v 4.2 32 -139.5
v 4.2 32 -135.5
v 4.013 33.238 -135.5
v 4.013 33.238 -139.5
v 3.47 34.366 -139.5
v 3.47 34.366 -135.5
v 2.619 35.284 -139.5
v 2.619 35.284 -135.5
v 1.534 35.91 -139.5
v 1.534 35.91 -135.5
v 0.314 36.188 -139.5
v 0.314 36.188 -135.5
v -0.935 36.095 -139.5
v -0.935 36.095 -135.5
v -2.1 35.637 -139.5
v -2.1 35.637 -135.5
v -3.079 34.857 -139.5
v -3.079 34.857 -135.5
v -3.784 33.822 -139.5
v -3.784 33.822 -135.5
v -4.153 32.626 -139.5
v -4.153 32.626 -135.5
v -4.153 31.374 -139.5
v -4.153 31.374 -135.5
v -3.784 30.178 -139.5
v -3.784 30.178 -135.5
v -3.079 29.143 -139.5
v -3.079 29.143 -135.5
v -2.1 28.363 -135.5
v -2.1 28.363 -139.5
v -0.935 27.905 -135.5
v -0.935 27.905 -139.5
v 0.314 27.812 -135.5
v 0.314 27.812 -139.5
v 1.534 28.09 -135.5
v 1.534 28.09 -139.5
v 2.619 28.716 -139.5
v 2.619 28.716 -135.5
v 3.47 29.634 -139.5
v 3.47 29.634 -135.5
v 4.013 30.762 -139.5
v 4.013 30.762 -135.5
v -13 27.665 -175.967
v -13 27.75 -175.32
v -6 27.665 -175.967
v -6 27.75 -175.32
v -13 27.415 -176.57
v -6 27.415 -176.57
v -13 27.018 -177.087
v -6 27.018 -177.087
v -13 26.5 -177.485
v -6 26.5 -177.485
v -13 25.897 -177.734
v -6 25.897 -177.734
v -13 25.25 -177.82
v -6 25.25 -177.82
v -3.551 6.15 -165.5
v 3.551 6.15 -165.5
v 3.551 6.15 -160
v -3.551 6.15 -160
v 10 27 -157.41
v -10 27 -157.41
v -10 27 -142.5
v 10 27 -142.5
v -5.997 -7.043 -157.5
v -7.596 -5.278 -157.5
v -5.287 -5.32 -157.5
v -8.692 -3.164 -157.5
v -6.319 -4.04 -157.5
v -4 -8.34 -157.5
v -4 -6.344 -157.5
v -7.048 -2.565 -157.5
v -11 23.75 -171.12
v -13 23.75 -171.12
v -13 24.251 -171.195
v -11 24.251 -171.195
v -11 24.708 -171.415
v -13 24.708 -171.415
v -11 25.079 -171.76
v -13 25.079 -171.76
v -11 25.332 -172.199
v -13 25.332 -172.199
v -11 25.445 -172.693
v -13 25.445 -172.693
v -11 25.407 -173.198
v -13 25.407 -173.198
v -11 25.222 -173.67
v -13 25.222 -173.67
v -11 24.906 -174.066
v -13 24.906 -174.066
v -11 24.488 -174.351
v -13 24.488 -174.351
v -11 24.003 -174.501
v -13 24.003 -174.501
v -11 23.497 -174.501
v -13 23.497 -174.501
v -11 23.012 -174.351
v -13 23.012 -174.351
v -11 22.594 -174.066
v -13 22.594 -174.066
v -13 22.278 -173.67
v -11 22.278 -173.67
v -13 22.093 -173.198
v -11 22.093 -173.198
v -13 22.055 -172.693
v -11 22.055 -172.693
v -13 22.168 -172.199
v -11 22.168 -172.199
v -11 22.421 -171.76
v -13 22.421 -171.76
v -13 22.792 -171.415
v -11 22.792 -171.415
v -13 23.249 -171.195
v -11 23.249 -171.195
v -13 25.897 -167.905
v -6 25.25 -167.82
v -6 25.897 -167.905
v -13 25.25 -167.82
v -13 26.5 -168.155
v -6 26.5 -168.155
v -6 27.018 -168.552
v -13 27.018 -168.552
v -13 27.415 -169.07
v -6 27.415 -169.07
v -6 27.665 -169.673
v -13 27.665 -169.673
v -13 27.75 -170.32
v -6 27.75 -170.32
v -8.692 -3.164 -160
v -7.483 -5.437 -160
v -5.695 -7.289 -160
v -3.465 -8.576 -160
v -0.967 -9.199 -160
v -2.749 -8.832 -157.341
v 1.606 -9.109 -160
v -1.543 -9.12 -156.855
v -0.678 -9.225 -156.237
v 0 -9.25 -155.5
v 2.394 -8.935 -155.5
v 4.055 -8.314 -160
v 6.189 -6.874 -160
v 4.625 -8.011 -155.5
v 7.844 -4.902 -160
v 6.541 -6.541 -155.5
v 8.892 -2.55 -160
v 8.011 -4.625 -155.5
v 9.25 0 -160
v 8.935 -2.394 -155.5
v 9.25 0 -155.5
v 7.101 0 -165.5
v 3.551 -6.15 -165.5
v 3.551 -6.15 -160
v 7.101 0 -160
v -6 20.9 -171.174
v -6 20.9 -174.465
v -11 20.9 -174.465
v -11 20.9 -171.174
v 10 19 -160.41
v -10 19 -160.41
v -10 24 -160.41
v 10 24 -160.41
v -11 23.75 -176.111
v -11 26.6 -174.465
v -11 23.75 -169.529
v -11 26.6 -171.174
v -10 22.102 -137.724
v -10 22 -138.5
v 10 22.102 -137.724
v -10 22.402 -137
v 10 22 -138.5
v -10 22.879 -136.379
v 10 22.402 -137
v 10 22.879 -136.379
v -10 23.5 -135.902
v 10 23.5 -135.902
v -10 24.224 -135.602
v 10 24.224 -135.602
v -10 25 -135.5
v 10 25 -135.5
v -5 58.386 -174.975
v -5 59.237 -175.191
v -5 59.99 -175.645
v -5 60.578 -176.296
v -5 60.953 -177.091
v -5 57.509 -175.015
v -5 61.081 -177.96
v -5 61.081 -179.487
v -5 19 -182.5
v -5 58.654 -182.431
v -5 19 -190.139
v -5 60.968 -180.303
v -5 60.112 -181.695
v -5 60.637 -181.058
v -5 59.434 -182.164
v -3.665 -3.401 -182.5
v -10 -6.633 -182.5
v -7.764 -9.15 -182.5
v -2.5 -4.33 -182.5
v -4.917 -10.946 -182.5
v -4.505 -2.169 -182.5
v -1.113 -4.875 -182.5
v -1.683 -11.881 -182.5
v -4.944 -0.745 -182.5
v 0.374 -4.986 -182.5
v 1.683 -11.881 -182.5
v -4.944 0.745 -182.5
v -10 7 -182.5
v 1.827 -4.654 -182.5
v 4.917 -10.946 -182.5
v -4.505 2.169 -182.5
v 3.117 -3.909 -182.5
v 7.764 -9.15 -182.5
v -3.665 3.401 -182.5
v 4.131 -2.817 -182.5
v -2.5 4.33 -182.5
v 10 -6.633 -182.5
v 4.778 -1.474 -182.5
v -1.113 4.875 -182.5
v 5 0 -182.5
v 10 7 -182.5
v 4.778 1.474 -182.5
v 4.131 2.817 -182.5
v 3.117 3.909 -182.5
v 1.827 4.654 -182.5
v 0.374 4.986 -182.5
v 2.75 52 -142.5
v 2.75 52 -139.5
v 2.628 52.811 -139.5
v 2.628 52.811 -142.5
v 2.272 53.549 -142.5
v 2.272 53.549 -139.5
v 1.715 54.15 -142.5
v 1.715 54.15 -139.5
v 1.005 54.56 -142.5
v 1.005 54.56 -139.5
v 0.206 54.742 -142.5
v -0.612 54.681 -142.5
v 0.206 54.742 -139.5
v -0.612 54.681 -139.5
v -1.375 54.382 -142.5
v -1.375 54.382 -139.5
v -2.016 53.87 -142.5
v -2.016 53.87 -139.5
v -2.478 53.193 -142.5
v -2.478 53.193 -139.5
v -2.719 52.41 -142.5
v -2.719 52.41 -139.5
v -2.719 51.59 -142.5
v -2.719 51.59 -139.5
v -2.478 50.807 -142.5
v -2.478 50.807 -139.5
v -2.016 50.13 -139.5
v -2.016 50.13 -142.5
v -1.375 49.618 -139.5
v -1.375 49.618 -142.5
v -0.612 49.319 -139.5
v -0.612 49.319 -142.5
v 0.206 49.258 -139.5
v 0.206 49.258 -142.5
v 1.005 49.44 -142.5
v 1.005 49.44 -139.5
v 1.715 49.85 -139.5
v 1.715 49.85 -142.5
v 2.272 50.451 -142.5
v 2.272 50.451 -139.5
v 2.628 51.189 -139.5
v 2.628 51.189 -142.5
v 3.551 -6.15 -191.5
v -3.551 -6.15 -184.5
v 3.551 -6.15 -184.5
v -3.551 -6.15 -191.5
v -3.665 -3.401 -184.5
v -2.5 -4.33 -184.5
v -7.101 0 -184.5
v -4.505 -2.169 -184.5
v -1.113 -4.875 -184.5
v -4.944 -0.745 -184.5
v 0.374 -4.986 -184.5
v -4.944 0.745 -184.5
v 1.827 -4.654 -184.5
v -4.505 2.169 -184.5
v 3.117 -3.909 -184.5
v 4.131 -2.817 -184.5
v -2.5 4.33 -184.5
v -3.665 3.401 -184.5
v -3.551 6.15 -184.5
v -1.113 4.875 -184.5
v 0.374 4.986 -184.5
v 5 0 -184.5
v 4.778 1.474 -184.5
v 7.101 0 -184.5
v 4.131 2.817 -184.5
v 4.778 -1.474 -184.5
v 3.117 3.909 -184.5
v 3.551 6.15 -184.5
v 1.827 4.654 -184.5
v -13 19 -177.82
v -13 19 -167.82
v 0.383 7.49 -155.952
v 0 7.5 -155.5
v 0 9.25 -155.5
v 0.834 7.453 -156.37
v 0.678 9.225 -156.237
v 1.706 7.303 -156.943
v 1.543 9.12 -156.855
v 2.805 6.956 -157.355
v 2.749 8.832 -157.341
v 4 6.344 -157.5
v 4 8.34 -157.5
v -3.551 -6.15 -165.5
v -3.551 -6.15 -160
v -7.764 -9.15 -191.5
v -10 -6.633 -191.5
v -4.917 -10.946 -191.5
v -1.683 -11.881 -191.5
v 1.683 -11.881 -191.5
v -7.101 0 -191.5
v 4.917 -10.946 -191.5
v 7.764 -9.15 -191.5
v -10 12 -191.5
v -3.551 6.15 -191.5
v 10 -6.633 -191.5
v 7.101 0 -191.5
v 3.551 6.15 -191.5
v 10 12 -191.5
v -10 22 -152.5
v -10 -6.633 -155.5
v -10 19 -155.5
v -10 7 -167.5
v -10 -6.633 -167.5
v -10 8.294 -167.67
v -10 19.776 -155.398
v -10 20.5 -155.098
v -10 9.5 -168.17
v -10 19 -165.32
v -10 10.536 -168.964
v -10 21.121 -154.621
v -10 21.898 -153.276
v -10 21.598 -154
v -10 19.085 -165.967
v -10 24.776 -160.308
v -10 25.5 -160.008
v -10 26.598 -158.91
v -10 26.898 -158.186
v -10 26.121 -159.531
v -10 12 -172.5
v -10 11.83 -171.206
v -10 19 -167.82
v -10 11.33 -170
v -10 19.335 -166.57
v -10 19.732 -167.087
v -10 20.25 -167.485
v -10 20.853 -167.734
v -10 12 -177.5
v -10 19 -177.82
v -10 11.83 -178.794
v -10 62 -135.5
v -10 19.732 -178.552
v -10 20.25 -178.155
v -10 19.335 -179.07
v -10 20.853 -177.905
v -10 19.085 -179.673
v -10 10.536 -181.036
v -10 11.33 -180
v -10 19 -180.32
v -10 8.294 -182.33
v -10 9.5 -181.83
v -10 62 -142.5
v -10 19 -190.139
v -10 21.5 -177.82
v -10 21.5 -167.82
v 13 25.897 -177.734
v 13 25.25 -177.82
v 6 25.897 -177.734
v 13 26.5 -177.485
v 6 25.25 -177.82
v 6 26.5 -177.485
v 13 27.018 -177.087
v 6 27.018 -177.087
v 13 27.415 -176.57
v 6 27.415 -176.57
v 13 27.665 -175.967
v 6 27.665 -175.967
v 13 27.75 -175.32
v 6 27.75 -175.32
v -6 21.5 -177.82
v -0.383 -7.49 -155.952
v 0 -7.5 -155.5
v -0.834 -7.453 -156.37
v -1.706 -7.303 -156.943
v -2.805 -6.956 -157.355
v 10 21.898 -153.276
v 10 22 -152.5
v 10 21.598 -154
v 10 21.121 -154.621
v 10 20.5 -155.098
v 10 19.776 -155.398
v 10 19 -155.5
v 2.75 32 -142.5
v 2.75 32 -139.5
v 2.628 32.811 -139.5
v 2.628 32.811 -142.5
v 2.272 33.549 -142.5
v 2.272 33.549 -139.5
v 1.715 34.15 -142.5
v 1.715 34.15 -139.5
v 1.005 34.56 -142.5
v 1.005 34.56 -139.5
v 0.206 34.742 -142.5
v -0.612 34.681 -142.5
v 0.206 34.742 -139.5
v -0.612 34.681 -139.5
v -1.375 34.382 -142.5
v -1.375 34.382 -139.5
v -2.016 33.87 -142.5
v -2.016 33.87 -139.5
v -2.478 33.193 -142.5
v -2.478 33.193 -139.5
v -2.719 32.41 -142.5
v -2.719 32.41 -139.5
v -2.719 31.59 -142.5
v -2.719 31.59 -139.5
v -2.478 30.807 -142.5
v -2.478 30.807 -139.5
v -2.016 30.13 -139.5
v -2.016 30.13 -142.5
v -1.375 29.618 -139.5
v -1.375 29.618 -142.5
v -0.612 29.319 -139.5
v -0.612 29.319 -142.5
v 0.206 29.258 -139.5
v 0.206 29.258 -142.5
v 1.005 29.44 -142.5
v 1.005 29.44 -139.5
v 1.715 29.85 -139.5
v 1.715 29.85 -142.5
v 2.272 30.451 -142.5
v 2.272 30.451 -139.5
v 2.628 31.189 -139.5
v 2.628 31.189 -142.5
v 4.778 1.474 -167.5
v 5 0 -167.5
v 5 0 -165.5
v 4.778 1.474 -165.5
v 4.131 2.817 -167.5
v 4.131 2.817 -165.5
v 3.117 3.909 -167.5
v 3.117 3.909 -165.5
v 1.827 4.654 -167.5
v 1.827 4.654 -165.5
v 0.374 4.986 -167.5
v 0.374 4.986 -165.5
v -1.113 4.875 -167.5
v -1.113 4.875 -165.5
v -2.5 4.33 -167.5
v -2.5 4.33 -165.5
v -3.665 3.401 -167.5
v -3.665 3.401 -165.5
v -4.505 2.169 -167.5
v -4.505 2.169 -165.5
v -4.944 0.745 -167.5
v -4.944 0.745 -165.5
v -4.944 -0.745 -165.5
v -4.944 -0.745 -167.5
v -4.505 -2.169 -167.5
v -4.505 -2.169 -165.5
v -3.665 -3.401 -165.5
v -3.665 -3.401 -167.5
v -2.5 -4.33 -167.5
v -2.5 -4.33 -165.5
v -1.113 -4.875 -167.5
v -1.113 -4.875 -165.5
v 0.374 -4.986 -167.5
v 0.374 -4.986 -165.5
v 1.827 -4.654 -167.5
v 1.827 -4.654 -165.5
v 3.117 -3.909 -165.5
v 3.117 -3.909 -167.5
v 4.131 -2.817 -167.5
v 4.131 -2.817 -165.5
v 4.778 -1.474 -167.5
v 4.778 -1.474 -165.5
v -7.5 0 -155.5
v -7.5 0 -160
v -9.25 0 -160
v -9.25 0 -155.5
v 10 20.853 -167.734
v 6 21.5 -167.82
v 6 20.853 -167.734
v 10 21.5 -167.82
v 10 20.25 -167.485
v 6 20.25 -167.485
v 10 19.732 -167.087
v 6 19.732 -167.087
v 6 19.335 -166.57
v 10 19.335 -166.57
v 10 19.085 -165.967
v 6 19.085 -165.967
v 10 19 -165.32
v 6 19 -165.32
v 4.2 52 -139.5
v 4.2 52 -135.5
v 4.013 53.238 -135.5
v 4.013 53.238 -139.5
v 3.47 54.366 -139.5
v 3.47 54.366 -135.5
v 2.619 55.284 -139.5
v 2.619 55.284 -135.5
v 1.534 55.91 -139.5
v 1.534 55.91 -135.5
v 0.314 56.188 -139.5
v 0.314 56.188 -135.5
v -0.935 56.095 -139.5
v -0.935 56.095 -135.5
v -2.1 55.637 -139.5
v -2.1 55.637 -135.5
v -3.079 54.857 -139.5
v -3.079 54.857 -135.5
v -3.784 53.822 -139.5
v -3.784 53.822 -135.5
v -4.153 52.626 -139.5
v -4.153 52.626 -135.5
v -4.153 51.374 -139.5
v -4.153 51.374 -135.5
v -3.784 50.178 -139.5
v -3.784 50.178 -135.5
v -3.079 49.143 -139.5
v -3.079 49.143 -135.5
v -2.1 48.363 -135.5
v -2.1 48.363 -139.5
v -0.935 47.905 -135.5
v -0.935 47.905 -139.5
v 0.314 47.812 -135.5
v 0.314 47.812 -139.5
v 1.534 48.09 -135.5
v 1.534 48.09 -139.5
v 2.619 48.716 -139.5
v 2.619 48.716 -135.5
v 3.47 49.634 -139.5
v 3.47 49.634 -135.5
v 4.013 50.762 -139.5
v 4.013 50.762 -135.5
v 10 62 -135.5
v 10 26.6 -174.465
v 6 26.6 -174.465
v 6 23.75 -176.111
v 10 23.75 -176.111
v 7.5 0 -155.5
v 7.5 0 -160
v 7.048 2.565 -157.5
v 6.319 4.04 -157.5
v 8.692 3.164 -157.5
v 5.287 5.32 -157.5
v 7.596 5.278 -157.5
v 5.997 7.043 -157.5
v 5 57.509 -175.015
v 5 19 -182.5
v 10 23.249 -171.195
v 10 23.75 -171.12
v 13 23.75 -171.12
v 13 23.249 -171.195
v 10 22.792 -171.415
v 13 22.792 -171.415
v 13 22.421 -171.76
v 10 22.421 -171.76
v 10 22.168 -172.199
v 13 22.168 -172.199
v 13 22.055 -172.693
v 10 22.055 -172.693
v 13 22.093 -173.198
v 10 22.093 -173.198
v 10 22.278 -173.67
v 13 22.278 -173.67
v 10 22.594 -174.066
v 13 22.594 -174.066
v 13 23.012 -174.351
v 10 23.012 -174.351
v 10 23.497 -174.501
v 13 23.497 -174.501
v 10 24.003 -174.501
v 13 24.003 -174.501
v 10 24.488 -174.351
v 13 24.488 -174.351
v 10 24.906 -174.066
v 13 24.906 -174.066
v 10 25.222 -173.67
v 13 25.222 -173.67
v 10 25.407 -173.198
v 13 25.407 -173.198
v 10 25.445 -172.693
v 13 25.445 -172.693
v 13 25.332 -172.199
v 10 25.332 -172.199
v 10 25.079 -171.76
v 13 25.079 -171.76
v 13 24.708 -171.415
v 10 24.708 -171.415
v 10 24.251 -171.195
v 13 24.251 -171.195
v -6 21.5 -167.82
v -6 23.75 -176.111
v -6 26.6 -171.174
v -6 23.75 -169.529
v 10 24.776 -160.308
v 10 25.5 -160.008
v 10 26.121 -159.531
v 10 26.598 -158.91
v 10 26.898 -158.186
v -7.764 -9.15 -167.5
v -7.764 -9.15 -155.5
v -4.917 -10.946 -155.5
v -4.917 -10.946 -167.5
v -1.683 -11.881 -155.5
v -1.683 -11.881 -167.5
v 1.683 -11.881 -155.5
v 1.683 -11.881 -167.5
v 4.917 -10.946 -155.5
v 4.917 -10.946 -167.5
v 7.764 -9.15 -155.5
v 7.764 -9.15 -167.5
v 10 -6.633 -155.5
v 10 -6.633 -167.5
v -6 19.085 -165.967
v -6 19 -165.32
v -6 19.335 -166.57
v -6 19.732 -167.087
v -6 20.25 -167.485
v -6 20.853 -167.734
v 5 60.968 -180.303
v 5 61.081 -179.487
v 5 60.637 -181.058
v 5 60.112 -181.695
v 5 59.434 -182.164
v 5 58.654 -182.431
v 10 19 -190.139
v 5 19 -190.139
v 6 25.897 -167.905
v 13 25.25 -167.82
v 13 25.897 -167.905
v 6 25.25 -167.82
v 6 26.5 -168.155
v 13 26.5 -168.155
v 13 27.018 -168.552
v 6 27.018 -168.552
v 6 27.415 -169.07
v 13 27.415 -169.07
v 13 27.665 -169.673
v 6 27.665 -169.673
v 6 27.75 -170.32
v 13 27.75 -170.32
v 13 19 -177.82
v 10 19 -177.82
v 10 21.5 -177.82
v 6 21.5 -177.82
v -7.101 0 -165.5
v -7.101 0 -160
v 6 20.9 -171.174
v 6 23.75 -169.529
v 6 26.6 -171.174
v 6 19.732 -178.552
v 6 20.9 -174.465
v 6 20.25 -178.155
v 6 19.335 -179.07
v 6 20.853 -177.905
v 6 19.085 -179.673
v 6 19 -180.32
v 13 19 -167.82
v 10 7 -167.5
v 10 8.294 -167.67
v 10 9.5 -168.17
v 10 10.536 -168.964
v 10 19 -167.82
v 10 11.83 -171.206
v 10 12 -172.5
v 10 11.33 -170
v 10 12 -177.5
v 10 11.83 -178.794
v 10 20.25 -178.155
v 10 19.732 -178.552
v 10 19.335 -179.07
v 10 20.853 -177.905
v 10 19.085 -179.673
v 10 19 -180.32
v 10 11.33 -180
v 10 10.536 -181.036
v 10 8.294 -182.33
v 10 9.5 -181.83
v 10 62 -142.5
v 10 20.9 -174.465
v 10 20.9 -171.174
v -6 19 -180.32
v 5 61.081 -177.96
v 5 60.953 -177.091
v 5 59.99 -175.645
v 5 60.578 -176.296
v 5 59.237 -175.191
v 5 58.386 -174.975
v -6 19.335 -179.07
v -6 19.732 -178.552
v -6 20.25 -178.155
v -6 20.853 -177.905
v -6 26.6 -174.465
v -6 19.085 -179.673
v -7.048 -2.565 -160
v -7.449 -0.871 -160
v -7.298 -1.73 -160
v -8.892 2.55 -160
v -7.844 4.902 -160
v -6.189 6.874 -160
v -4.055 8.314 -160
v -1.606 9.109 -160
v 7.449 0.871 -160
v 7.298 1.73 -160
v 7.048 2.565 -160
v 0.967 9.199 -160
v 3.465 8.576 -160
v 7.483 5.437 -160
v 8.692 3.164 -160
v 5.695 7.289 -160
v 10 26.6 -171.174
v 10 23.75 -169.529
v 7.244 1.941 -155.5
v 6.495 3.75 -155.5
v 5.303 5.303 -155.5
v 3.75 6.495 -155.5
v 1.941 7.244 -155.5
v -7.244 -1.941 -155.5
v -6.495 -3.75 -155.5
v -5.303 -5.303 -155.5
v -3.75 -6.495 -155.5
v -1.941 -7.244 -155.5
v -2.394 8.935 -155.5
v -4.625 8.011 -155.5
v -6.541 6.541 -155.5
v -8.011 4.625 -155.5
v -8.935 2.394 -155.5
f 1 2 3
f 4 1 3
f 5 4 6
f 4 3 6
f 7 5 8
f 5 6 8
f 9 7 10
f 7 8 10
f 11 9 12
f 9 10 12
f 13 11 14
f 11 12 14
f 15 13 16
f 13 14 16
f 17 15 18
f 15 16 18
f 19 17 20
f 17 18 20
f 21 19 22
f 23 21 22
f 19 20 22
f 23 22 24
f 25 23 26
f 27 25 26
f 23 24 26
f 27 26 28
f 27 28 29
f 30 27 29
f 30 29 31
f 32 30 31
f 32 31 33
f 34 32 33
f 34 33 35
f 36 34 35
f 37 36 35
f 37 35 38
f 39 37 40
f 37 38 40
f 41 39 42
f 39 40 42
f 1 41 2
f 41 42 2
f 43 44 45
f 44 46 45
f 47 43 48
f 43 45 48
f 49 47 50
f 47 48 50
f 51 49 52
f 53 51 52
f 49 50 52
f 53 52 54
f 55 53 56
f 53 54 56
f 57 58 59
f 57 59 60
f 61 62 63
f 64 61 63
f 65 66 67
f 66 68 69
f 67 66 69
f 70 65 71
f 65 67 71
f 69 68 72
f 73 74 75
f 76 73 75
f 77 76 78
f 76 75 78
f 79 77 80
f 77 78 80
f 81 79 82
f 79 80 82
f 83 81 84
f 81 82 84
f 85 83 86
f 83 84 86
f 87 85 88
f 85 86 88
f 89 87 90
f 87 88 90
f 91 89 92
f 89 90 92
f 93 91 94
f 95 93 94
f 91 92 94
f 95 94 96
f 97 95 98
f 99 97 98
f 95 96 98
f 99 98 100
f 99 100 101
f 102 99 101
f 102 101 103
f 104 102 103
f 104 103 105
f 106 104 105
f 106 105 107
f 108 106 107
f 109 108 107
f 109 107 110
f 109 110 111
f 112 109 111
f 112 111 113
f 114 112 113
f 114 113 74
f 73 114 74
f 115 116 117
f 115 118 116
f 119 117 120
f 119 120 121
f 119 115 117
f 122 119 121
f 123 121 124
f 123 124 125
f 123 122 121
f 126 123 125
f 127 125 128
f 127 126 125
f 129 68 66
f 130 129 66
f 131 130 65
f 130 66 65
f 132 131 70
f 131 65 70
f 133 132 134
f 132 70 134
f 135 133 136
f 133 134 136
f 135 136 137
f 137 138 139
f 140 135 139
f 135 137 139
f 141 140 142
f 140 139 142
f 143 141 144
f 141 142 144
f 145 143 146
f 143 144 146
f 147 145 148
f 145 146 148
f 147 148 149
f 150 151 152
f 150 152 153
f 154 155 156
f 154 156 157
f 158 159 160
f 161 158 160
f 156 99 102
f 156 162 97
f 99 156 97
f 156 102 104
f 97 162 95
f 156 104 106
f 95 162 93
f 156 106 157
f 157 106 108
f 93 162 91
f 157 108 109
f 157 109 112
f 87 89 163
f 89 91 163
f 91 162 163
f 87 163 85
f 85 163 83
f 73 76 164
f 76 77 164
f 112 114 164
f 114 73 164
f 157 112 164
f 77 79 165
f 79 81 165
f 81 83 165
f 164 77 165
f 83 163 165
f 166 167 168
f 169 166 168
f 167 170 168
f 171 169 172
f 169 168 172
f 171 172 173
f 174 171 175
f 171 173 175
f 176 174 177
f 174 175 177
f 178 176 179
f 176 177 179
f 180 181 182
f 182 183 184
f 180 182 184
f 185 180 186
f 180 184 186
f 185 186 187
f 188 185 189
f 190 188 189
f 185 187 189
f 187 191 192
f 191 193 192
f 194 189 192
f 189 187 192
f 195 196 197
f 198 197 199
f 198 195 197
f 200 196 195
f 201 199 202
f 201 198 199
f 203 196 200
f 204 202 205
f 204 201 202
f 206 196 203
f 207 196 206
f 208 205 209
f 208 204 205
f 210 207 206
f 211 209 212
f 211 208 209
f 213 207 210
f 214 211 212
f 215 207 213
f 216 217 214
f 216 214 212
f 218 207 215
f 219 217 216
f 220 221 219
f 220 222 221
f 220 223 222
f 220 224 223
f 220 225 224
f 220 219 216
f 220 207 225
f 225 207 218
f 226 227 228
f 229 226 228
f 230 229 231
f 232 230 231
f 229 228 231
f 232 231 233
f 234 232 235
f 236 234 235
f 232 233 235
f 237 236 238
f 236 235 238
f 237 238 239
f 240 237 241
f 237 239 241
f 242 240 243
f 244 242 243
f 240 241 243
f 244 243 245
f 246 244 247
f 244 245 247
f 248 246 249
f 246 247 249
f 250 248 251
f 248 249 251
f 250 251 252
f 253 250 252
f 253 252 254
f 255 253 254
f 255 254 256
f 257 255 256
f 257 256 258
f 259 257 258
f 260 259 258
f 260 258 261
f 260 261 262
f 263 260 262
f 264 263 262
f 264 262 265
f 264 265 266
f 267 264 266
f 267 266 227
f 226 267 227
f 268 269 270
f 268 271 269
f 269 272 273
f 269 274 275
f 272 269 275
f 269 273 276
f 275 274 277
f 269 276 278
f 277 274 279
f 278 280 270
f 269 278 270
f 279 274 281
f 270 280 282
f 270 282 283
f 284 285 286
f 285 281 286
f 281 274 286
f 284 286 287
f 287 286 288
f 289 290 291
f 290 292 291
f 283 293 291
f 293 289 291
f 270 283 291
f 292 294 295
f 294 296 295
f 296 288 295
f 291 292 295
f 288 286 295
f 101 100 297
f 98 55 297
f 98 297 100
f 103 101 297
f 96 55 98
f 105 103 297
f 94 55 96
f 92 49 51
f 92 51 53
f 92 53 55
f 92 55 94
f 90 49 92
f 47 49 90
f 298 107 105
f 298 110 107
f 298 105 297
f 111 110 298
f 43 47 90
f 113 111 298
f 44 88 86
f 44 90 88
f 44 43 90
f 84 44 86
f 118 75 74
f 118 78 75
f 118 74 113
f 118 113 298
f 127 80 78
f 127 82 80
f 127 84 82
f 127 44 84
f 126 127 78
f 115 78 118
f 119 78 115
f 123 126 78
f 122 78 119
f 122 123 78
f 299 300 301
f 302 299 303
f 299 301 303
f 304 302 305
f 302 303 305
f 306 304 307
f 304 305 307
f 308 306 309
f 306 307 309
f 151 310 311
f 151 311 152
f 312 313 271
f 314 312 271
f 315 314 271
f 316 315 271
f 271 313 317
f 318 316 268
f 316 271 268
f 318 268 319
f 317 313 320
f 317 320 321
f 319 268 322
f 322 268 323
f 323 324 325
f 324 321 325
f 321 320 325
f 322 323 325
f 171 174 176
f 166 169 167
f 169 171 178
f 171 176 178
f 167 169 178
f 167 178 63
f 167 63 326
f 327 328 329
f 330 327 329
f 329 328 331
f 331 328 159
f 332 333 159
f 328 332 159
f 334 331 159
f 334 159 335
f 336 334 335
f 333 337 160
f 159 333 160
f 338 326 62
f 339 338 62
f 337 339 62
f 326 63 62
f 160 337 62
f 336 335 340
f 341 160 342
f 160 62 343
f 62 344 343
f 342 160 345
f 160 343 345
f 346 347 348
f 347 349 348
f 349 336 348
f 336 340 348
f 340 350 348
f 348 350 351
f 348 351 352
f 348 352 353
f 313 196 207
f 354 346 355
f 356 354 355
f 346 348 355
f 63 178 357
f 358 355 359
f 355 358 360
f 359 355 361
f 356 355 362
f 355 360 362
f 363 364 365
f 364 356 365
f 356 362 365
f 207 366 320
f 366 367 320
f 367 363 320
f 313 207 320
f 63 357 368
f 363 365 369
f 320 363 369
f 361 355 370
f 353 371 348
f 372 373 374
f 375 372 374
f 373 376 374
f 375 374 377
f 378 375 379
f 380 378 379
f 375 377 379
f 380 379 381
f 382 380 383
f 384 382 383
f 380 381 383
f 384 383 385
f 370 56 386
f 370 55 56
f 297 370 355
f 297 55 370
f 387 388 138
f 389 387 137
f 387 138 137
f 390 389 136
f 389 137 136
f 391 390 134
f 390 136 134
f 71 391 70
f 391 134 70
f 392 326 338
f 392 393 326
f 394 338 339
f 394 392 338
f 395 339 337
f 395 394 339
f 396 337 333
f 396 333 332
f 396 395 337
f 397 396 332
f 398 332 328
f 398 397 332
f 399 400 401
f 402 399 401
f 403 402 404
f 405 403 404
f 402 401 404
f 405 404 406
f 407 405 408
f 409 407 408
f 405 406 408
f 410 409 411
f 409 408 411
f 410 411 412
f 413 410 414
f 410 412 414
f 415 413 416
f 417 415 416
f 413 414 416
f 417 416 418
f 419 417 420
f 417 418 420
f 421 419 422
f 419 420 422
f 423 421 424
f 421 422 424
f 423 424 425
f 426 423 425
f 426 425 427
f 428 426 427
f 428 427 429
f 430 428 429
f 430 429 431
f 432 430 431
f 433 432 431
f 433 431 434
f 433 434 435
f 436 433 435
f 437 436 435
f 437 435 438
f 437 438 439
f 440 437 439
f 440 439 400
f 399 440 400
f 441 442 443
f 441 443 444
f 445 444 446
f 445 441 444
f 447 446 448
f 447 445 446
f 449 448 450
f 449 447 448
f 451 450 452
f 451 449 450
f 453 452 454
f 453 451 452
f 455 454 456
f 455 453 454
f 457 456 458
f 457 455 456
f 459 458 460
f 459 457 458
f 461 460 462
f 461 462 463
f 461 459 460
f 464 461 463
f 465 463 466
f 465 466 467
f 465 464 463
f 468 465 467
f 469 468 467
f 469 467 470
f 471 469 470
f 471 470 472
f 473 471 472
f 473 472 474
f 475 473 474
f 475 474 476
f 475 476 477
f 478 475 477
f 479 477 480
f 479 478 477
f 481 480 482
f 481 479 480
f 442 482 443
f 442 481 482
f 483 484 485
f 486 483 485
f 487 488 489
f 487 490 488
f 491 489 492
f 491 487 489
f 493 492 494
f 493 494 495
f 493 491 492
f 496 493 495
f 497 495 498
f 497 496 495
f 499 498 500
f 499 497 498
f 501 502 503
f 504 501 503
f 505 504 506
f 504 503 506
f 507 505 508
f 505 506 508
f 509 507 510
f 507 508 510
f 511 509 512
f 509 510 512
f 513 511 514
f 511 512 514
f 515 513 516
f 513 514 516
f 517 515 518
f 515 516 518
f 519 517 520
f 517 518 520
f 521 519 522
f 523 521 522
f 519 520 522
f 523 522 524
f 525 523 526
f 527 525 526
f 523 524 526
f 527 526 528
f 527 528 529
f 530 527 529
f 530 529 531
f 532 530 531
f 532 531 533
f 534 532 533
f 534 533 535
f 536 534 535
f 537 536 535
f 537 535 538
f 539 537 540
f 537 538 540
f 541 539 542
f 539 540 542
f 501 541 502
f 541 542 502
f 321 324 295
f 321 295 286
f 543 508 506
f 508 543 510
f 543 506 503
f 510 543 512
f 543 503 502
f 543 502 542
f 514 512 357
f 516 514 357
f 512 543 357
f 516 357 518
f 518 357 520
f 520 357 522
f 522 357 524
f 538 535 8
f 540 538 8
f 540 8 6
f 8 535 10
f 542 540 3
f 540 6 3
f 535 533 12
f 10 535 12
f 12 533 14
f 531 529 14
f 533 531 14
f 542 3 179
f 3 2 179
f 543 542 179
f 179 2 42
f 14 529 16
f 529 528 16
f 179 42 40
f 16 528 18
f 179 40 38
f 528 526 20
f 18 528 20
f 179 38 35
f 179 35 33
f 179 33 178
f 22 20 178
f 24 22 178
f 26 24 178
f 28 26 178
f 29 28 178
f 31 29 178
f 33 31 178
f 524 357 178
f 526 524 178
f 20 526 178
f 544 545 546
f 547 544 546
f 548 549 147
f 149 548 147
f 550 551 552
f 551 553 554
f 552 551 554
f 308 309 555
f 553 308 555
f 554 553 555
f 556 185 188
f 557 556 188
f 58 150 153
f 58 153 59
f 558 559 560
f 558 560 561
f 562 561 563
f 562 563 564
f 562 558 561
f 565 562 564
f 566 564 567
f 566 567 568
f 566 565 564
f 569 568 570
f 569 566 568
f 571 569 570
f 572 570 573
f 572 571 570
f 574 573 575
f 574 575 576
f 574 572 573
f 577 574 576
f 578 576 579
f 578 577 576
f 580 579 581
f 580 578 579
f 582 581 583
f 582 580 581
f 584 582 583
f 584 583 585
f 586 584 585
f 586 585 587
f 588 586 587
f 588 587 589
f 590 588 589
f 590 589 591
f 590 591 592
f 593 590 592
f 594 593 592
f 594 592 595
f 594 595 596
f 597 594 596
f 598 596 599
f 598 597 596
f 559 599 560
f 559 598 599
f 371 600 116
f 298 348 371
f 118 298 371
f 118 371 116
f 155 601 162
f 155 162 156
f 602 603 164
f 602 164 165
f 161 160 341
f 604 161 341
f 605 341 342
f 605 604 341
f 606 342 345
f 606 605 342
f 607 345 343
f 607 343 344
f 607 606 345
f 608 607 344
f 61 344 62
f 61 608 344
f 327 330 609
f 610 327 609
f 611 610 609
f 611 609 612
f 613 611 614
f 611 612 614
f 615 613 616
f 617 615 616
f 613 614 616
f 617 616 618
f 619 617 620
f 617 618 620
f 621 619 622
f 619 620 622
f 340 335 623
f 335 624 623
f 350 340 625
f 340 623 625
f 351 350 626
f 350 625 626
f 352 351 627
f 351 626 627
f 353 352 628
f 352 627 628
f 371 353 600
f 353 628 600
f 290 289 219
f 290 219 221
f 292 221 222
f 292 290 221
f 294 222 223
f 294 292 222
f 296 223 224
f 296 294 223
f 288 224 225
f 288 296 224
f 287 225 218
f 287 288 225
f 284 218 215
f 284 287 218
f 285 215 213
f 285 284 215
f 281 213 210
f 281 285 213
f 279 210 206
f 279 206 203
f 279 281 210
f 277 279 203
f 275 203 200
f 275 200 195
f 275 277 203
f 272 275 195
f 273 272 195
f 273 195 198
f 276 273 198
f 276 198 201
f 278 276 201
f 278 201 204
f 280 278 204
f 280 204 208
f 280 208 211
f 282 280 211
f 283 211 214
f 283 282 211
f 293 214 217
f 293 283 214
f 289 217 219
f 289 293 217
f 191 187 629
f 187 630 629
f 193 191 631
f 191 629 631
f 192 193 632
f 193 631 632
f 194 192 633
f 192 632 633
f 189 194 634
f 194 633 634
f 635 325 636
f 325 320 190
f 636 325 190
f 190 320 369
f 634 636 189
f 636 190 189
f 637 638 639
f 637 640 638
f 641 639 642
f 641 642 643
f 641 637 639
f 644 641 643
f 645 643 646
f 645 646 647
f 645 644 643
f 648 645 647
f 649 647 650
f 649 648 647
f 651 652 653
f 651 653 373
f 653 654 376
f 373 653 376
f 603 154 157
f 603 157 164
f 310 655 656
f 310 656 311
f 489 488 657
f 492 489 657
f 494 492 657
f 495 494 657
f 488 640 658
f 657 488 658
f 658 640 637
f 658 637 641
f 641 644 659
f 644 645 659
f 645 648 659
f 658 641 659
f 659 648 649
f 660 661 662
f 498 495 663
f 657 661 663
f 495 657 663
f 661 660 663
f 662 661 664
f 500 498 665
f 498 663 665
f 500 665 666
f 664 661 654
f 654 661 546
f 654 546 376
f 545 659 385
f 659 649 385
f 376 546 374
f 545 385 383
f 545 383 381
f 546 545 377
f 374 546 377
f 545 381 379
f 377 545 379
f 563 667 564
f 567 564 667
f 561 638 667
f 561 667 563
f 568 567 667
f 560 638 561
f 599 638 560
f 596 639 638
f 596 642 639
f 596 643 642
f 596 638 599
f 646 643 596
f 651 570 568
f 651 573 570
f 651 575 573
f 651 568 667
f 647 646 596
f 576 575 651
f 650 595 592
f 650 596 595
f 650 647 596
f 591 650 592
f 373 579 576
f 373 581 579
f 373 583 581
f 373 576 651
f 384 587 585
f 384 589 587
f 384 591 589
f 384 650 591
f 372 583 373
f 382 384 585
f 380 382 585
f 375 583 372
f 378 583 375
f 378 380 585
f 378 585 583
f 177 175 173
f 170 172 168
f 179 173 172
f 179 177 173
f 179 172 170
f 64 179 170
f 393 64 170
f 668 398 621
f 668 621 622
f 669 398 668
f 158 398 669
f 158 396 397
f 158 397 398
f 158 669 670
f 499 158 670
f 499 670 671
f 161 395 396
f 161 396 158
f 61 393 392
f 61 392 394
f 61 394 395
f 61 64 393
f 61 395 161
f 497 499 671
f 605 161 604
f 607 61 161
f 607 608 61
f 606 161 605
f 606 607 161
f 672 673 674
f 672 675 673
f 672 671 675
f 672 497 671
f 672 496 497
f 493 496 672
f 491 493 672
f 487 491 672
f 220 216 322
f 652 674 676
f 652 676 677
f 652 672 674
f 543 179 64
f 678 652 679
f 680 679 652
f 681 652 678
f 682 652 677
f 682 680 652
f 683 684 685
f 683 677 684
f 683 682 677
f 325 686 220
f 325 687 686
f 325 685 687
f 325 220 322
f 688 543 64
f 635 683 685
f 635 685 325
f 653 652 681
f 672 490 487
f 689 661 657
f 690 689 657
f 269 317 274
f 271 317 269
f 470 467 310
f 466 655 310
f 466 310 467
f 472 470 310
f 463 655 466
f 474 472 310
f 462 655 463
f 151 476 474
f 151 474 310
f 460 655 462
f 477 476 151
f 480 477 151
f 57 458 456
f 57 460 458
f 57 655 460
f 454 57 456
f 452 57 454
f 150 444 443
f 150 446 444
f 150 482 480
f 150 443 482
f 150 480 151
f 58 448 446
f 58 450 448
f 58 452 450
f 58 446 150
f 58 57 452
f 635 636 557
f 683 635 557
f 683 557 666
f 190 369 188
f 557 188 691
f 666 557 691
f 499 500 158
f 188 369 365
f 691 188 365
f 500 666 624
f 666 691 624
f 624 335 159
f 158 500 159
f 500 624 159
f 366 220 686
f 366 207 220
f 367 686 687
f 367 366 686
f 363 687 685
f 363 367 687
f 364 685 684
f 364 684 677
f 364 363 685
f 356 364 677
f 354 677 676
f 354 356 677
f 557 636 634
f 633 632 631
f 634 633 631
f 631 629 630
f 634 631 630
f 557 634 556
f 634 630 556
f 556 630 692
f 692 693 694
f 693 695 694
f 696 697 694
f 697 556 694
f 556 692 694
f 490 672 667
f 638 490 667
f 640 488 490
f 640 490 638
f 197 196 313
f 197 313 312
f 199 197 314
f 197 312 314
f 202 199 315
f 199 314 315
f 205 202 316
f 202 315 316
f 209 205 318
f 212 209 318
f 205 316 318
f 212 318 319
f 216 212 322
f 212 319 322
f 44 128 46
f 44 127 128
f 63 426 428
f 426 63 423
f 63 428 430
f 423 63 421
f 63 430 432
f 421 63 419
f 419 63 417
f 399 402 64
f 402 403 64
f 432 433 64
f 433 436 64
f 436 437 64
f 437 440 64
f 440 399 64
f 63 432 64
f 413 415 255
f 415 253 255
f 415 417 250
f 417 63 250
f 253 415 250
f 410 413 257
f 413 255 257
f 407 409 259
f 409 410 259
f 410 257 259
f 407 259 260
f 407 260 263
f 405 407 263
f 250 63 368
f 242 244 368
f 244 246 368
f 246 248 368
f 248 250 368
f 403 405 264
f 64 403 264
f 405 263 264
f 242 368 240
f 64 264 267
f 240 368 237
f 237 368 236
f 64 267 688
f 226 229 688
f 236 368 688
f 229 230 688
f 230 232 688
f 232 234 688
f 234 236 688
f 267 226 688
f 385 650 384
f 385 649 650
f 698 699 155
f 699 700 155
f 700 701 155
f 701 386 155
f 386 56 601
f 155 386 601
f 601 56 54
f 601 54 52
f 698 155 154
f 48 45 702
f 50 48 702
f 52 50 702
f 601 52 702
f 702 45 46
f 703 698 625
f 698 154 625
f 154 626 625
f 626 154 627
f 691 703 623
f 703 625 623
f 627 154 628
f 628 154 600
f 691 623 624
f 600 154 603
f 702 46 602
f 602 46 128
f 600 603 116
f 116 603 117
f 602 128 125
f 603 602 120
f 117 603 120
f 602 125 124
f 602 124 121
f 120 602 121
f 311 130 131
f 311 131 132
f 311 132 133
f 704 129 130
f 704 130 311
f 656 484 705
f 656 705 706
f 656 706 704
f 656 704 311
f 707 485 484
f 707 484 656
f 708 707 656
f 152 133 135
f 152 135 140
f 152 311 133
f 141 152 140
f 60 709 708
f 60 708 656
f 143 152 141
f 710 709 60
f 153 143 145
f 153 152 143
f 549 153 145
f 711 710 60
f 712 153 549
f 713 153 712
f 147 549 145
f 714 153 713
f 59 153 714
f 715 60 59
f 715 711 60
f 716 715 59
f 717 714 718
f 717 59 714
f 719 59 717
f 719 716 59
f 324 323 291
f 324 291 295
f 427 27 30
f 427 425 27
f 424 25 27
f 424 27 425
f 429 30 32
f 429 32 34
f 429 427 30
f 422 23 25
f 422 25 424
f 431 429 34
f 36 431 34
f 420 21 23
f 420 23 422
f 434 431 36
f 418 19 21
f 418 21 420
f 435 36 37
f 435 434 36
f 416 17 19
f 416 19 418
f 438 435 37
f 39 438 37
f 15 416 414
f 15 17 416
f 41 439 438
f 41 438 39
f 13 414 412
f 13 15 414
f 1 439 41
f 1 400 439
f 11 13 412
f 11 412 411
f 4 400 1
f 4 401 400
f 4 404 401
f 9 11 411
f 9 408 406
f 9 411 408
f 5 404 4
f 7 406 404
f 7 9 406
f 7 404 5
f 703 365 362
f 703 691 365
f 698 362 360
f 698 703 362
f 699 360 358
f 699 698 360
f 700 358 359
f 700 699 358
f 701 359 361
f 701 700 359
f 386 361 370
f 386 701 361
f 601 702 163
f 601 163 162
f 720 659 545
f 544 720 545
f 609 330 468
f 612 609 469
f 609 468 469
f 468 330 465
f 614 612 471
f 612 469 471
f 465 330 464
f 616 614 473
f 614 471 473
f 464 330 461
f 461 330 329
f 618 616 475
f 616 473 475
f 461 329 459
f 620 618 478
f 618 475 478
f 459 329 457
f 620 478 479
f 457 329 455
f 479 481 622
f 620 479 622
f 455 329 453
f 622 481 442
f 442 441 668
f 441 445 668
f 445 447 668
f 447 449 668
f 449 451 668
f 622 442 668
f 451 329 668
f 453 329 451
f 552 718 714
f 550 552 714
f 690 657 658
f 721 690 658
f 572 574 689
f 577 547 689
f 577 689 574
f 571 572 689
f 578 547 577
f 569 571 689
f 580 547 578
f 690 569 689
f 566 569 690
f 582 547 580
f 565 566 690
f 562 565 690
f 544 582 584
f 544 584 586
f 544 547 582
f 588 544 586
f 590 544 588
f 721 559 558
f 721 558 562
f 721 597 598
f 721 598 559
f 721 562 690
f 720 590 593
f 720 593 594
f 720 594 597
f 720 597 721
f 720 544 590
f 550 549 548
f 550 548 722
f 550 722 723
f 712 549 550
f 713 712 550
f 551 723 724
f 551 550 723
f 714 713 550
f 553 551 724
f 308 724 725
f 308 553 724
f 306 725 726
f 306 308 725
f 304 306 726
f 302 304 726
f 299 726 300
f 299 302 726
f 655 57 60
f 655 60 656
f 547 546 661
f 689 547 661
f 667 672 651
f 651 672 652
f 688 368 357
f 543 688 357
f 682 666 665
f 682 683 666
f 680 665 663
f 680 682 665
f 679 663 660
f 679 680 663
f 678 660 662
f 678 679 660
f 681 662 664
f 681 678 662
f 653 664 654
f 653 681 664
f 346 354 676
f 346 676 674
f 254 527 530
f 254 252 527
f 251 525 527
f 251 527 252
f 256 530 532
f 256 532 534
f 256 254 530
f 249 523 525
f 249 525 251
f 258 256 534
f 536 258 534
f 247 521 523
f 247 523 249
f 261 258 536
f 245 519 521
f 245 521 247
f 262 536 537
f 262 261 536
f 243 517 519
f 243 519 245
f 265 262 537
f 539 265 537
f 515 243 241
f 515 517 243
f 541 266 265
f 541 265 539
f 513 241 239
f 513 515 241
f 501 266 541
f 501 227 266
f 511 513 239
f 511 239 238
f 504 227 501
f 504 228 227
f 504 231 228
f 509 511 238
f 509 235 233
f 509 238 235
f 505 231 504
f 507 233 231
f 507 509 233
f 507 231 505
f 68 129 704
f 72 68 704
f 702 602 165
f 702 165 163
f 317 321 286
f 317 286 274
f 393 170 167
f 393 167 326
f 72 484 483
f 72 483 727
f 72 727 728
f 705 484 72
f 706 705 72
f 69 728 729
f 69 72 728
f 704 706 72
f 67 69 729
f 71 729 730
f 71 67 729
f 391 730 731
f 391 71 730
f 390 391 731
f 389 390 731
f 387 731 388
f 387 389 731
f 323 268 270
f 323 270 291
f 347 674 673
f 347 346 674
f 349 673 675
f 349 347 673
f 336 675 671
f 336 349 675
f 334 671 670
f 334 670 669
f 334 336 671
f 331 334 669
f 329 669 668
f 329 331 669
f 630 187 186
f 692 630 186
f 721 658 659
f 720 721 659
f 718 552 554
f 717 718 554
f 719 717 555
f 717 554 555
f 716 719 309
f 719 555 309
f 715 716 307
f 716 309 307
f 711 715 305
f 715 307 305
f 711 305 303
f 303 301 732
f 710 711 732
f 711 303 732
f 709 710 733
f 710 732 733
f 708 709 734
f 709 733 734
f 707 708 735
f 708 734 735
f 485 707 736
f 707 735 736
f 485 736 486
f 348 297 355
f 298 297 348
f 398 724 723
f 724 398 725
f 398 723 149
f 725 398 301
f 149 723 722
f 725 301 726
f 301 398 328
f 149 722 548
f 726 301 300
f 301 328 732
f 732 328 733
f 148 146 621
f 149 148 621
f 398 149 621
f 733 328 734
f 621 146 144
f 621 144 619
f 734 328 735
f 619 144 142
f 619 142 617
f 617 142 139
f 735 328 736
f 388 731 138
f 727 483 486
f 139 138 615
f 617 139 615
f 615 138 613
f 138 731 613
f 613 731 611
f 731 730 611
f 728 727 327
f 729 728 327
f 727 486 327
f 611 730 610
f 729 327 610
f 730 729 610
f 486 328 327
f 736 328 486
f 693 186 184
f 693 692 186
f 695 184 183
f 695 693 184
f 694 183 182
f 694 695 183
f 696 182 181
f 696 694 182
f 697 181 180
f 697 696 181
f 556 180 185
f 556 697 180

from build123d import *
from build123d.topology import SkipClean

# Parameters (mm, degrees)
BOSS_EXTRUDE1_DEPTH  = 5
CUT_EXTRUDE1_DEPTH   = 17.401219467
BOSS_EXTRUDE2_DEPTH  = 2
SKETCH6_R            = 5
BOSS_EXTRUDE3_DEPTH  = 2
SKETCH7_R            = 5
BOSS_EXTRUDE4_DEPTH  = 2
BOSS_EXTRUDE5_DEPTH  = 10
SKETCH9_R            = 7.5
CUT_EXTRUDE2_DEPTH   = 4.5
SKETCH11_R           = 9.25
CUT_EXTRUDE3_DEPTH   = 4.5
BOSS_EXTRUDE6_DEPTH  = 4.5
BOSS_EXTRUDE7_DEPTH  = 2
FILLET1_R            = 5
CUT_EXTRUDE4_START   = -4.5
SKETCH15_R           = 7.5
CUT_EXTRUDE4_DEPTH   = 4.5
BOSS_EXTRUDE8_DEPTH  = 20
FILLET2_R            = 5
SKETCH17_W           = 5
SKETCH17_H           = 9.540449769
SKETCH17_H_2         = 7.639337836
SKETCH17_H_3         = 12.1686109
CUT_EXTRUDE5_DEPTH   = 42.081359172
FILLET3_R            = 3
BOSS_EXTRUDE9_DEPTH  = 4
BOSS_EXTRUDE10_START = -4
SKETCH19_W           = 10
SKETCH19_H           = 8.75
SKETCH19_R           = 1.7
BOSS_EXTRUDE10_DEPTH = 4
BOSS_EXTRUDE11_START = 3
SKETCH20_W           = 10
SKETCH20_H           = 8.75
SKETCH20_R           = 1.7
BOSS_EXTRUDE11_DEPTH = 3
SKETCH21_W           = 10
SKETCH21_H           = 8.75
SKETCH21_R           = 1.7
BOSS_EXTRUDE12_DEPTH = 3
CUT_EXTRUDE6_DEPTH   = 4
CUT_EXTRUDE7_DEPTH   = 5
FILLET5_R            = 2.5
BOSS_EXTRUDE14_DEPTH = 20
SKETCH27_W           = 20
SKETCH27_H           = 40
BOSS_EXTRUDE16_DEPTH = 7
SKETCH28_R           = 4.2
CUT_EXTRUDE8_DEPTH   = 4
SKETCH29_R           = 2.75
CUT_EXTRUDE9_DEPTH   = 4
FILLET6_R            = 3


with BuildPart() as part:
    # Sketch2 → Boss-Extrude1 (new body)
    # profile 1 of 2: a face of its own
    with BuildSketch(Plane.XY.offset(-191.5)):
        with BuildLine():
            Line((10, 12), (0, 12))
            ThreePointArc((0, 12), (-5.674548662, 10.573528147), (-10, 6.633249581))
            Line((-10, 6.633249581), (-10, -6.633249581))
            ThreePointArc((-10, -6.633249581), (0, -12), (10, -6.633249581))
            Line((10, -6.633249581), (10, 12))
        make_face()
        Polygon((6.92820323, 0), (3.464101615, -6), (-3.464101615, -6), (-6.92820323, 0), (-3.464101615, 6), (3.464101615, 6), align=None, mode=Mode.SUBTRACT)
    # profile 2 of 2: a face of its own
    with BuildSketch(Plane.XY.offset(-191.5)):
        with BuildLine():
            ThreePointArc((-10, 6.633249581), (-5.674548662, 10.573528147), (0, 12))
            Line((0, 12), (-10, 12))
            Line((-10, 12), (-10, 6.633249581))
        make_face()
    extrude(amount=BOSS_EXTRUDE1_DEPTH)

    # Sketch3 → Cut-Extrude1 (cut, through all)
    with BuildSketch(Plane.XY.offset(-186.5)):
        Polygon((7.101408311, 0), (3.550704156, 6.15), (-3.550704156, 6.15), (-7.101408311, 0), (-3.550704156, -6.15), (3.550704156, -6.15), align=None)
    extrude(amount=-CUT_EXTRUDE1_DEPTH, mode=Mode.SUBTRACT)

    # Sketch5 → Boss-Extrude2 (add)
    with BuildSketch(Plane.XY.offset(-186.5)):
        with BuildLine():
            Line((10, 12), (-10, 12))
            Line((-10, 12), (-10, -6.633249581))
            ThreePointArc((-10, -6.633249581), (0, -12), (10, -6.633249581))
            Line((10, -6.633249581), (10, 12))
        make_face()
        Polygon((-3.550704156, -6.15), (3.550704156, -6.15), (7.101408311, 0), (3.550704156, 6.15), (-3.550704156, 6.15), (-7.101408311, 0), align=None, mode=Mode.SUBTRACT)
    extrude(amount=BOSS_EXTRUDE2_DEPTH)

    # Sketch6 → Boss-Extrude3 (add)
    with BuildSketch(Plane.XY.offset(-184.5)):
        with BuildLine():
            Line((10, -6.633249581), (10, 12))
            Line((10, 12), (-10, 12))
            Line((-10, 12), (-10, -6.633249581))
            ThreePointArc((-10, -6.633249581), (0, -12), (10, -6.633249581))
        make_face()
        Circle(SKETCH6_R, mode=Mode.SUBTRACT)
    extrude(amount=BOSS_EXTRUDE3_DEPTH)



with BuildPart() as body_2:
    # Sketch7 → Boss-Extrude4 (new body)
    with BuildSketch(Plane.XY.offset(-167.5)):
        with BuildLine():
            Line((10, -6.633249581), (10, 12))
            Line((10, 12), (-10, 12))
            Line((-10, 12), (-10, -6.633249581))
            ThreePointArc((-10, -6.633249581), (0, -12), (10, -6.633249581))
        make_face()
        Circle(SKETCH7_R, mode=Mode.SUBTRACT)
    extrude(amount=BOSS_EXTRUDE4_DEPTH)

    # Sketch8 → Boss-Extrude5 (add)
    with BuildSketch(Plane.XY.offset(-165.5)):
        with BuildLine():
            Line((10, -6.633249581), (10, 12))
            Line((10, 12), (-10, 12))
            Line((-10, 12), (-10, -6.633249581))
            ThreePointArc((-10, -6.633249581), (0, -12), (10, -6.633249581))
        make_face()
        Polygon((7.101408311, 0), (3.550704156, 6.15), (-3.550704156, 6.15), (-7.101408311, 0), (-3.550704156, -6.15), (3.550704156, -6.15), align=None, mode=Mode.SUBTRACT)
    extrude(amount=BOSS_EXTRUDE5_DEPTH)

    # Sketch9 → Cut-Extrude2 (cut)
    with BuildSketch(Plane.XY.offset(-155.5)):
        Circle(SKETCH9_R)
    extrude(amount=-CUT_EXTRUDE2_DEPTH, mode=Mode.SUBTRACT)

    # Sketch11 → Cut-Extrude3 (cut)
    with BuildSketch(Plane.XY.offset(-155.5)):
        Circle(SKETCH11_R)
    extrude(amount=-CUT_EXTRUDE3_DEPTH, mode=Mode.SUBTRACT)

    # Sketch13 → Boss-Extrude6 (add)
    with BuildSketch(Plane.XY.offset(-160)):
        with BuildLine():
            Line((5.868261699, 2.135872585), (7.101408311, 0))
            Line((7.101408311, 0), (9.25, 0))
            ThreePointArc((9.25, 0), (9.109471715, 1.606245643), (8.692156742, 3.163686326))
            Line((8.692156742, 3.163686326), (5.868261699, 2.135872585))
        make_face()
        with BuildLine():
            Line((-5.868261699, -2.135872585), (-7.101408311, 0))
            Line((-7.101408311, 0), (-9.25, 0))
            ThreePointArc((-9.25, 0), (-9.109471715, -1.606245643), (-8.692156742, -3.163686326))
            Line((-8.692156742, -3.163686326), (-5.868261699, -2.135872585))
        make_face()
    extrude(amount=BOSS_EXTRUDE6_DEPTH)

    # Sketch14 → Boss-Extrude7 (add)
    with BuildSketch(Plane.XY.offset(-155.5)):
        with BuildLine():
            Line((0, 9.25), (0, 6.15))
            Line((0, 6.15), (3.550704156, 6.15))
            Line((3.550704156, 6.15), (5.868261699, 2.135872585))
            Line((5.868261699, 2.135872585), (8.692156742, 3.163686326))
            ThreePointArc((8.692156742, 3.163686326), (5.305582036, 7.57715641), (0, 9.25))
        make_face()
        with BuildLine():
            Line((0, -9.25), (0, -6.15))
            Line((0, -6.15), (-3.550704156, -6.15))
            Line((-3.550704156, -6.15), (-5.868261699, -2.135872585))
            Line((-5.868261699, -2.135872585), (-8.692156742, -3.163686326))
            ThreePointArc((-8.692156742, -3.163686326), (-5.305582036, -7.57715641), (0, -9.25))
        make_face()
    extrude(amount=-BOSS_EXTRUDE7_DEPTH)

    # Fillet1
    # the kernel refuses this fillet: 5 mm, written as the material it takes off along each edge
    with BuildSketch(Plane(origin=(0, -19.25, -157.5), x_dir=(-1, 0, 0), z_dir=(0, 1, 0))) as fillet1_piece_1_section:
        with BuildLine():
            CenterArc((4, 5), FILLET1_R, 216.869897646, 53.130102354)
            Line((0, 2), (0, 0))
            Line((0, 0), (4, 0))
        make_face()
    fillet1_piece_1 = extrude(amount=23.1, mode=Mode.PRIVATE)
    fillet1_piece_1 = fillet1_piece_1 & Plane(origin=(0, 0, -157.389372656), x_dir=(1, 0, 0), z_dir=(0, 0, 1)) * Cylinder(9.25, 63, mode=Mode.PRIVATE)
    add(fillet1_piece_1, mode=Mode.SUBTRACT)
    with BuildSketch(Plane(origin=(0, 19.25, -157.5), x_dir=(0, 0, 1), z_dir=(0, -1, 0))) as fillet1_piece_2_section:
        with BuildLine():
            CenterArc((5, -4), FILLET1_R, 126.869897646, 53.130102354)
            Line((0, -4), (0, 0))
            Line((0, 0), (2, 0))
        make_face()
    fillet1_piece_2 = extrude(amount=23.1, mode=Mode.PRIVATE)
    fillet1_piece_2 = fillet1_piece_2 & Plane(origin=(0, 0, -157.389372656), x_dir=(1, 0, 0), z_dir=(0, 0, 1)) * Cylinder(9.25, 63, mode=Mode.PRIVATE)
    add(fillet1_piece_2, mode=Mode.SUBTRACT)

    # Sketch15 → Cut-Extrude4 (cut)
    with BuildSketch(Plane.XY.offset(-155.5).offset(CUT_EXTRUDE4_START)):
        Circle(SKETCH15_R)
    extrude(amount=CUT_EXTRUDE4_DEPTH, mode=Mode.SUBTRACT)


with BuildPart() as part_1:
    add(part.part)

    add(body_2.part)  # Boss-Extrude8 merges body 2
    # Sketch16 → Boss-Extrude8 (add)
    with BuildSketch(Plane.ZY.offset(10)):
        Polygon((-191.5, 12), (-181.959550231, 61.081359172), (-174.320212395, 61.081359172), (-182.5, 19), (-155.5, 19), (-155.5, 12), (-182.5, 12), align=None)
    extrude(amount=-BOSS_EXTRUDE8_DEPTH)

    # Fillet2
    fillet2_edges = [part_1.edges().sort_by_distance(p)[0] for p in [
        (0, 12, -167.5),
        (0, 12, -182.5),
    ]]
    fillet(fillet2_edges, radius=FILLET2_R)

    # Sketch17 → Cut-Extrude5 (cut)
    with BuildSketch(Plane(origin=(0, 61.081359172, 0), x_dir=(1, 0, 0), z_dir=(0, 1, 0))):
        with Locations((-7.5, 186.729775115)):
            Rectangle(SKETCH17_W, SKETCH17_H)
        with Locations((-7.5, 178.139881313)):
            Rectangle(SKETCH17_W, SKETCH17_H_2)
        with Locations((7.5, 178.139881313)):
            Rectangle(SKETCH17_W, SKETCH17_H_2)
        with Locations((7.5, 188.043855681)):
            Rectangle(SKETCH17_W, SKETCH17_H_3)
    extrude(amount=-CUT_EXTRUDE5_DEPTH, mode=Mode.SUBTRACT)

    # Fillet3
    fillet3_edges = [part_1.edges().sort_by_distance(p)[0] for p in [
        (0, 61.081359172, -174.320212395),
        (0, 61.081359172, -181.959550231),
    ]]
    fillet(fillet3_edges, radius=FILLET3_R)

    # Sketch18 → Boss-Extrude9 (add)
    with BuildSketch(Plane.ZY.offset(10)):
        with BuildLine():
            Line((-172.819668918, 19.75), (-172.819668918, 19))
            Line((-172.819668918, 19), (-167.819668918, 19))
            Line((-167.819668918, 19), (-167.819668918, 27.75))
            Line((-167.819668918, 27.75), (-172.819668918, 27.75))
            Line((-172.819668918, 27.75), (-172.819668918, 25.45))
            ThreePointArc((-172.819668918, 25.45), (-171.61758739, 24.952081528), (-171.119668918, 23.75))
            ThreePointArc((-171.119668918, 23.75), (-171.61758739, 22.547918472), (-172.819668918, 22.05))
            Line((-172.819668918, 22.05), (-172.819668918, 19.75))
        make_face()
        with BuildLine():
            Line((-177.819668918, 19), (-172.819668918, 19))
            Line((-172.819668918, 19), (-172.819668918, 19.75))
            Line((-172.819668918, 19.75), (-172.819668918, 22.05))
            ThreePointArc((-172.819668918, 22.05), (-174.519668918, 23.75), (-172.819668918, 25.45))
            Line((-172.819668918, 25.45), (-172.819668918, 27.75))
            Line((-172.819668918, 27.75), (-177.819668918, 27.75))
            Line((-177.819668918, 27.75), (-177.819668918, 19))
        make_face()
    extrude(amount=-BOSS_EXTRUDE9_DEPTH)

    # Sketch19 → Boss-Extrude10 (add)
    with BuildSketch(Plane(origin=(10, 0, 0), x_dir=(0, 0, -1), z_dir=(1, 0, 0)).offset(BOSS_EXTRUDE10_START)):
        with Locations((172.819668918, 23.375)):
            Rectangle(SKETCH19_W, SKETCH19_H)
        with Locations(Location((172.819668918, 23.75, 0), (0, 0, 180))):
            Circle(SKETCH19_R, mode=Mode.SUBTRACT)
    extrude(amount=BOSS_EXTRUDE10_DEPTH)

    # Sketch20 → Boss-Extrude11 (add)
    with SkipClean():  # the faces are left unmerged after this step: merging them gives an invalid solid
        with BuildSketch(Plane.ZY.offset(10).offset(BOSS_EXTRUDE11_START)):
            with Locations((-172.819668918, 23.375)):
                Rectangle(SKETCH20_W, SKETCH20_H)
            with Locations((-172.819668918, 23.75)):
                Circle(SKETCH20_R, mode=Mode.SUBTRACT)
        extrude(amount=-BOSS_EXTRUDE11_DEPTH)

    # Sketch21 → Boss-Extrude12 (add)
    with SkipClean():  # the faces are left unmerged after this step: merging them gives an invalid solid
        with BuildSketch(Plane(origin=(10, 0, 0), x_dir=(0, 0, -1), z_dir=(1, 0, 0))):
            with Locations((172.819668918, 23.375)):
                Rectangle(SKETCH21_W, SKETCH21_H)
            with Locations(Location((172.819668918, 23.75, 0), (0, 0, 180))):
                Circle(SKETCH21_R, mode=Mode.SUBTRACT)
        extrude(amount=BOSS_EXTRUDE12_DEPTH)

    # Sketch22 → Cut-Extrude6 (cut)
    with SkipClean():  # the faces are left unmerged after this step: merging them gives an invalid solid
        with BuildSketch(Plane.ZY.offset(-6)):
            Polygon((-169.528772384, 23.75), (-171.174220651, 26.6), (-174.465117185, 26.6), (-176.110565452, 23.75), (-174.465117185, 20.9), (-171.174220651, 20.9), align=None)
        extrude(amount=-CUT_EXTRUDE6_DEPTH, mode=Mode.SUBTRACT)

    # Sketch23 → Cut-Extrude7 (cut)
    with BuildSketch(Plane(origin=(-6, 0, 0), x_dir=(0, 0, -1), z_dir=(1, 0, 0))):
        Polygon((169.528772384, 23.75), (171.174220651, 26.6), (174.465117185, 26.6), (176.110565452, 23.75), (174.465117185, 20.9), (171.174220651, 20.9), align=None)
    extrude(amount=-CUT_EXTRUDE7_DEPTH, mode=Mode.SUBTRACT)

    # Fillet5
    fillet5_edges = [part_1.edges().sort_by_distance(p)[0] for p in [
        (-8, 19, -177.819668918),
        (-9.5, 27.75, -177.819668918),
        (-9.5, 27.75, -167.819668918),
        (-8, 19, -167.819668918),
        (8, 19, -177.819668918),
        (8, 19, -167.819668918),
        (9.5, 27.75, -167.819668918),
        (9.5, 27.75, -177.819668918),
    ]]
    fillet(fillet5_edges, radius=FILLET5_R)

    # Sketch25 → Boss-Extrude14 (add)
    with BuildSketch(Plane.ZY.offset(10)):
        Polygon((-160.409834459, 19), (-160.409834459, 27), (-139.5, 27), (-139.5, 62), (-135.5, 62), (-135.5, 22), (-155.5, 22), (-155.5, 19), align=None)
    extrude(amount=-BOSS_EXTRUDE14_DEPTH)

    # Sketch27 → Boss-Extrude16 (add)
    with BuildSketch(Plane.XY.offset(-135.5)):
        with Locations((0, 42)):
            Rectangle(SKETCH27_W, SKETCH27_H)
    extrude(amount=-BOSS_EXTRUDE16_DEPTH)

    # Sketch28 → Cut-Extrude8 (cut)
    with BuildSketch(Plane.XY.offset(-135.5)):
        with Locations((0, 32)):
            Circle(SKETCH28_R)
        with Locations((0, 52)):
            Circle(SKETCH28_R)
    extrude(amount=-CUT_EXTRUDE8_DEPTH, mode=Mode.SUBTRACT)

    # Sketch29 → Cut-Extrude9 (cut)
    with BuildSketch(Plane.XY.offset(-139.5)):
        with Locations((0, 32)):
            Circle(SKETCH29_R)
        with Locations((0, 52)):
            Circle(SKETCH29_R)
    extrude(amount=-CUT_EXTRUDE9_DEPTH, mode=Mode.SUBTRACT)

    # Fillet6
    fillet6_edges = [part_1.edges().sort_by_distance(p)[0] for p in [
        (0, 22, -155.5),
        (0, 22, -135.5),
        (0, 27, -160.409834459),
    ]]
    fillet(fillet6_edges, radius=FILLET6_R)


solid = part_1.part
